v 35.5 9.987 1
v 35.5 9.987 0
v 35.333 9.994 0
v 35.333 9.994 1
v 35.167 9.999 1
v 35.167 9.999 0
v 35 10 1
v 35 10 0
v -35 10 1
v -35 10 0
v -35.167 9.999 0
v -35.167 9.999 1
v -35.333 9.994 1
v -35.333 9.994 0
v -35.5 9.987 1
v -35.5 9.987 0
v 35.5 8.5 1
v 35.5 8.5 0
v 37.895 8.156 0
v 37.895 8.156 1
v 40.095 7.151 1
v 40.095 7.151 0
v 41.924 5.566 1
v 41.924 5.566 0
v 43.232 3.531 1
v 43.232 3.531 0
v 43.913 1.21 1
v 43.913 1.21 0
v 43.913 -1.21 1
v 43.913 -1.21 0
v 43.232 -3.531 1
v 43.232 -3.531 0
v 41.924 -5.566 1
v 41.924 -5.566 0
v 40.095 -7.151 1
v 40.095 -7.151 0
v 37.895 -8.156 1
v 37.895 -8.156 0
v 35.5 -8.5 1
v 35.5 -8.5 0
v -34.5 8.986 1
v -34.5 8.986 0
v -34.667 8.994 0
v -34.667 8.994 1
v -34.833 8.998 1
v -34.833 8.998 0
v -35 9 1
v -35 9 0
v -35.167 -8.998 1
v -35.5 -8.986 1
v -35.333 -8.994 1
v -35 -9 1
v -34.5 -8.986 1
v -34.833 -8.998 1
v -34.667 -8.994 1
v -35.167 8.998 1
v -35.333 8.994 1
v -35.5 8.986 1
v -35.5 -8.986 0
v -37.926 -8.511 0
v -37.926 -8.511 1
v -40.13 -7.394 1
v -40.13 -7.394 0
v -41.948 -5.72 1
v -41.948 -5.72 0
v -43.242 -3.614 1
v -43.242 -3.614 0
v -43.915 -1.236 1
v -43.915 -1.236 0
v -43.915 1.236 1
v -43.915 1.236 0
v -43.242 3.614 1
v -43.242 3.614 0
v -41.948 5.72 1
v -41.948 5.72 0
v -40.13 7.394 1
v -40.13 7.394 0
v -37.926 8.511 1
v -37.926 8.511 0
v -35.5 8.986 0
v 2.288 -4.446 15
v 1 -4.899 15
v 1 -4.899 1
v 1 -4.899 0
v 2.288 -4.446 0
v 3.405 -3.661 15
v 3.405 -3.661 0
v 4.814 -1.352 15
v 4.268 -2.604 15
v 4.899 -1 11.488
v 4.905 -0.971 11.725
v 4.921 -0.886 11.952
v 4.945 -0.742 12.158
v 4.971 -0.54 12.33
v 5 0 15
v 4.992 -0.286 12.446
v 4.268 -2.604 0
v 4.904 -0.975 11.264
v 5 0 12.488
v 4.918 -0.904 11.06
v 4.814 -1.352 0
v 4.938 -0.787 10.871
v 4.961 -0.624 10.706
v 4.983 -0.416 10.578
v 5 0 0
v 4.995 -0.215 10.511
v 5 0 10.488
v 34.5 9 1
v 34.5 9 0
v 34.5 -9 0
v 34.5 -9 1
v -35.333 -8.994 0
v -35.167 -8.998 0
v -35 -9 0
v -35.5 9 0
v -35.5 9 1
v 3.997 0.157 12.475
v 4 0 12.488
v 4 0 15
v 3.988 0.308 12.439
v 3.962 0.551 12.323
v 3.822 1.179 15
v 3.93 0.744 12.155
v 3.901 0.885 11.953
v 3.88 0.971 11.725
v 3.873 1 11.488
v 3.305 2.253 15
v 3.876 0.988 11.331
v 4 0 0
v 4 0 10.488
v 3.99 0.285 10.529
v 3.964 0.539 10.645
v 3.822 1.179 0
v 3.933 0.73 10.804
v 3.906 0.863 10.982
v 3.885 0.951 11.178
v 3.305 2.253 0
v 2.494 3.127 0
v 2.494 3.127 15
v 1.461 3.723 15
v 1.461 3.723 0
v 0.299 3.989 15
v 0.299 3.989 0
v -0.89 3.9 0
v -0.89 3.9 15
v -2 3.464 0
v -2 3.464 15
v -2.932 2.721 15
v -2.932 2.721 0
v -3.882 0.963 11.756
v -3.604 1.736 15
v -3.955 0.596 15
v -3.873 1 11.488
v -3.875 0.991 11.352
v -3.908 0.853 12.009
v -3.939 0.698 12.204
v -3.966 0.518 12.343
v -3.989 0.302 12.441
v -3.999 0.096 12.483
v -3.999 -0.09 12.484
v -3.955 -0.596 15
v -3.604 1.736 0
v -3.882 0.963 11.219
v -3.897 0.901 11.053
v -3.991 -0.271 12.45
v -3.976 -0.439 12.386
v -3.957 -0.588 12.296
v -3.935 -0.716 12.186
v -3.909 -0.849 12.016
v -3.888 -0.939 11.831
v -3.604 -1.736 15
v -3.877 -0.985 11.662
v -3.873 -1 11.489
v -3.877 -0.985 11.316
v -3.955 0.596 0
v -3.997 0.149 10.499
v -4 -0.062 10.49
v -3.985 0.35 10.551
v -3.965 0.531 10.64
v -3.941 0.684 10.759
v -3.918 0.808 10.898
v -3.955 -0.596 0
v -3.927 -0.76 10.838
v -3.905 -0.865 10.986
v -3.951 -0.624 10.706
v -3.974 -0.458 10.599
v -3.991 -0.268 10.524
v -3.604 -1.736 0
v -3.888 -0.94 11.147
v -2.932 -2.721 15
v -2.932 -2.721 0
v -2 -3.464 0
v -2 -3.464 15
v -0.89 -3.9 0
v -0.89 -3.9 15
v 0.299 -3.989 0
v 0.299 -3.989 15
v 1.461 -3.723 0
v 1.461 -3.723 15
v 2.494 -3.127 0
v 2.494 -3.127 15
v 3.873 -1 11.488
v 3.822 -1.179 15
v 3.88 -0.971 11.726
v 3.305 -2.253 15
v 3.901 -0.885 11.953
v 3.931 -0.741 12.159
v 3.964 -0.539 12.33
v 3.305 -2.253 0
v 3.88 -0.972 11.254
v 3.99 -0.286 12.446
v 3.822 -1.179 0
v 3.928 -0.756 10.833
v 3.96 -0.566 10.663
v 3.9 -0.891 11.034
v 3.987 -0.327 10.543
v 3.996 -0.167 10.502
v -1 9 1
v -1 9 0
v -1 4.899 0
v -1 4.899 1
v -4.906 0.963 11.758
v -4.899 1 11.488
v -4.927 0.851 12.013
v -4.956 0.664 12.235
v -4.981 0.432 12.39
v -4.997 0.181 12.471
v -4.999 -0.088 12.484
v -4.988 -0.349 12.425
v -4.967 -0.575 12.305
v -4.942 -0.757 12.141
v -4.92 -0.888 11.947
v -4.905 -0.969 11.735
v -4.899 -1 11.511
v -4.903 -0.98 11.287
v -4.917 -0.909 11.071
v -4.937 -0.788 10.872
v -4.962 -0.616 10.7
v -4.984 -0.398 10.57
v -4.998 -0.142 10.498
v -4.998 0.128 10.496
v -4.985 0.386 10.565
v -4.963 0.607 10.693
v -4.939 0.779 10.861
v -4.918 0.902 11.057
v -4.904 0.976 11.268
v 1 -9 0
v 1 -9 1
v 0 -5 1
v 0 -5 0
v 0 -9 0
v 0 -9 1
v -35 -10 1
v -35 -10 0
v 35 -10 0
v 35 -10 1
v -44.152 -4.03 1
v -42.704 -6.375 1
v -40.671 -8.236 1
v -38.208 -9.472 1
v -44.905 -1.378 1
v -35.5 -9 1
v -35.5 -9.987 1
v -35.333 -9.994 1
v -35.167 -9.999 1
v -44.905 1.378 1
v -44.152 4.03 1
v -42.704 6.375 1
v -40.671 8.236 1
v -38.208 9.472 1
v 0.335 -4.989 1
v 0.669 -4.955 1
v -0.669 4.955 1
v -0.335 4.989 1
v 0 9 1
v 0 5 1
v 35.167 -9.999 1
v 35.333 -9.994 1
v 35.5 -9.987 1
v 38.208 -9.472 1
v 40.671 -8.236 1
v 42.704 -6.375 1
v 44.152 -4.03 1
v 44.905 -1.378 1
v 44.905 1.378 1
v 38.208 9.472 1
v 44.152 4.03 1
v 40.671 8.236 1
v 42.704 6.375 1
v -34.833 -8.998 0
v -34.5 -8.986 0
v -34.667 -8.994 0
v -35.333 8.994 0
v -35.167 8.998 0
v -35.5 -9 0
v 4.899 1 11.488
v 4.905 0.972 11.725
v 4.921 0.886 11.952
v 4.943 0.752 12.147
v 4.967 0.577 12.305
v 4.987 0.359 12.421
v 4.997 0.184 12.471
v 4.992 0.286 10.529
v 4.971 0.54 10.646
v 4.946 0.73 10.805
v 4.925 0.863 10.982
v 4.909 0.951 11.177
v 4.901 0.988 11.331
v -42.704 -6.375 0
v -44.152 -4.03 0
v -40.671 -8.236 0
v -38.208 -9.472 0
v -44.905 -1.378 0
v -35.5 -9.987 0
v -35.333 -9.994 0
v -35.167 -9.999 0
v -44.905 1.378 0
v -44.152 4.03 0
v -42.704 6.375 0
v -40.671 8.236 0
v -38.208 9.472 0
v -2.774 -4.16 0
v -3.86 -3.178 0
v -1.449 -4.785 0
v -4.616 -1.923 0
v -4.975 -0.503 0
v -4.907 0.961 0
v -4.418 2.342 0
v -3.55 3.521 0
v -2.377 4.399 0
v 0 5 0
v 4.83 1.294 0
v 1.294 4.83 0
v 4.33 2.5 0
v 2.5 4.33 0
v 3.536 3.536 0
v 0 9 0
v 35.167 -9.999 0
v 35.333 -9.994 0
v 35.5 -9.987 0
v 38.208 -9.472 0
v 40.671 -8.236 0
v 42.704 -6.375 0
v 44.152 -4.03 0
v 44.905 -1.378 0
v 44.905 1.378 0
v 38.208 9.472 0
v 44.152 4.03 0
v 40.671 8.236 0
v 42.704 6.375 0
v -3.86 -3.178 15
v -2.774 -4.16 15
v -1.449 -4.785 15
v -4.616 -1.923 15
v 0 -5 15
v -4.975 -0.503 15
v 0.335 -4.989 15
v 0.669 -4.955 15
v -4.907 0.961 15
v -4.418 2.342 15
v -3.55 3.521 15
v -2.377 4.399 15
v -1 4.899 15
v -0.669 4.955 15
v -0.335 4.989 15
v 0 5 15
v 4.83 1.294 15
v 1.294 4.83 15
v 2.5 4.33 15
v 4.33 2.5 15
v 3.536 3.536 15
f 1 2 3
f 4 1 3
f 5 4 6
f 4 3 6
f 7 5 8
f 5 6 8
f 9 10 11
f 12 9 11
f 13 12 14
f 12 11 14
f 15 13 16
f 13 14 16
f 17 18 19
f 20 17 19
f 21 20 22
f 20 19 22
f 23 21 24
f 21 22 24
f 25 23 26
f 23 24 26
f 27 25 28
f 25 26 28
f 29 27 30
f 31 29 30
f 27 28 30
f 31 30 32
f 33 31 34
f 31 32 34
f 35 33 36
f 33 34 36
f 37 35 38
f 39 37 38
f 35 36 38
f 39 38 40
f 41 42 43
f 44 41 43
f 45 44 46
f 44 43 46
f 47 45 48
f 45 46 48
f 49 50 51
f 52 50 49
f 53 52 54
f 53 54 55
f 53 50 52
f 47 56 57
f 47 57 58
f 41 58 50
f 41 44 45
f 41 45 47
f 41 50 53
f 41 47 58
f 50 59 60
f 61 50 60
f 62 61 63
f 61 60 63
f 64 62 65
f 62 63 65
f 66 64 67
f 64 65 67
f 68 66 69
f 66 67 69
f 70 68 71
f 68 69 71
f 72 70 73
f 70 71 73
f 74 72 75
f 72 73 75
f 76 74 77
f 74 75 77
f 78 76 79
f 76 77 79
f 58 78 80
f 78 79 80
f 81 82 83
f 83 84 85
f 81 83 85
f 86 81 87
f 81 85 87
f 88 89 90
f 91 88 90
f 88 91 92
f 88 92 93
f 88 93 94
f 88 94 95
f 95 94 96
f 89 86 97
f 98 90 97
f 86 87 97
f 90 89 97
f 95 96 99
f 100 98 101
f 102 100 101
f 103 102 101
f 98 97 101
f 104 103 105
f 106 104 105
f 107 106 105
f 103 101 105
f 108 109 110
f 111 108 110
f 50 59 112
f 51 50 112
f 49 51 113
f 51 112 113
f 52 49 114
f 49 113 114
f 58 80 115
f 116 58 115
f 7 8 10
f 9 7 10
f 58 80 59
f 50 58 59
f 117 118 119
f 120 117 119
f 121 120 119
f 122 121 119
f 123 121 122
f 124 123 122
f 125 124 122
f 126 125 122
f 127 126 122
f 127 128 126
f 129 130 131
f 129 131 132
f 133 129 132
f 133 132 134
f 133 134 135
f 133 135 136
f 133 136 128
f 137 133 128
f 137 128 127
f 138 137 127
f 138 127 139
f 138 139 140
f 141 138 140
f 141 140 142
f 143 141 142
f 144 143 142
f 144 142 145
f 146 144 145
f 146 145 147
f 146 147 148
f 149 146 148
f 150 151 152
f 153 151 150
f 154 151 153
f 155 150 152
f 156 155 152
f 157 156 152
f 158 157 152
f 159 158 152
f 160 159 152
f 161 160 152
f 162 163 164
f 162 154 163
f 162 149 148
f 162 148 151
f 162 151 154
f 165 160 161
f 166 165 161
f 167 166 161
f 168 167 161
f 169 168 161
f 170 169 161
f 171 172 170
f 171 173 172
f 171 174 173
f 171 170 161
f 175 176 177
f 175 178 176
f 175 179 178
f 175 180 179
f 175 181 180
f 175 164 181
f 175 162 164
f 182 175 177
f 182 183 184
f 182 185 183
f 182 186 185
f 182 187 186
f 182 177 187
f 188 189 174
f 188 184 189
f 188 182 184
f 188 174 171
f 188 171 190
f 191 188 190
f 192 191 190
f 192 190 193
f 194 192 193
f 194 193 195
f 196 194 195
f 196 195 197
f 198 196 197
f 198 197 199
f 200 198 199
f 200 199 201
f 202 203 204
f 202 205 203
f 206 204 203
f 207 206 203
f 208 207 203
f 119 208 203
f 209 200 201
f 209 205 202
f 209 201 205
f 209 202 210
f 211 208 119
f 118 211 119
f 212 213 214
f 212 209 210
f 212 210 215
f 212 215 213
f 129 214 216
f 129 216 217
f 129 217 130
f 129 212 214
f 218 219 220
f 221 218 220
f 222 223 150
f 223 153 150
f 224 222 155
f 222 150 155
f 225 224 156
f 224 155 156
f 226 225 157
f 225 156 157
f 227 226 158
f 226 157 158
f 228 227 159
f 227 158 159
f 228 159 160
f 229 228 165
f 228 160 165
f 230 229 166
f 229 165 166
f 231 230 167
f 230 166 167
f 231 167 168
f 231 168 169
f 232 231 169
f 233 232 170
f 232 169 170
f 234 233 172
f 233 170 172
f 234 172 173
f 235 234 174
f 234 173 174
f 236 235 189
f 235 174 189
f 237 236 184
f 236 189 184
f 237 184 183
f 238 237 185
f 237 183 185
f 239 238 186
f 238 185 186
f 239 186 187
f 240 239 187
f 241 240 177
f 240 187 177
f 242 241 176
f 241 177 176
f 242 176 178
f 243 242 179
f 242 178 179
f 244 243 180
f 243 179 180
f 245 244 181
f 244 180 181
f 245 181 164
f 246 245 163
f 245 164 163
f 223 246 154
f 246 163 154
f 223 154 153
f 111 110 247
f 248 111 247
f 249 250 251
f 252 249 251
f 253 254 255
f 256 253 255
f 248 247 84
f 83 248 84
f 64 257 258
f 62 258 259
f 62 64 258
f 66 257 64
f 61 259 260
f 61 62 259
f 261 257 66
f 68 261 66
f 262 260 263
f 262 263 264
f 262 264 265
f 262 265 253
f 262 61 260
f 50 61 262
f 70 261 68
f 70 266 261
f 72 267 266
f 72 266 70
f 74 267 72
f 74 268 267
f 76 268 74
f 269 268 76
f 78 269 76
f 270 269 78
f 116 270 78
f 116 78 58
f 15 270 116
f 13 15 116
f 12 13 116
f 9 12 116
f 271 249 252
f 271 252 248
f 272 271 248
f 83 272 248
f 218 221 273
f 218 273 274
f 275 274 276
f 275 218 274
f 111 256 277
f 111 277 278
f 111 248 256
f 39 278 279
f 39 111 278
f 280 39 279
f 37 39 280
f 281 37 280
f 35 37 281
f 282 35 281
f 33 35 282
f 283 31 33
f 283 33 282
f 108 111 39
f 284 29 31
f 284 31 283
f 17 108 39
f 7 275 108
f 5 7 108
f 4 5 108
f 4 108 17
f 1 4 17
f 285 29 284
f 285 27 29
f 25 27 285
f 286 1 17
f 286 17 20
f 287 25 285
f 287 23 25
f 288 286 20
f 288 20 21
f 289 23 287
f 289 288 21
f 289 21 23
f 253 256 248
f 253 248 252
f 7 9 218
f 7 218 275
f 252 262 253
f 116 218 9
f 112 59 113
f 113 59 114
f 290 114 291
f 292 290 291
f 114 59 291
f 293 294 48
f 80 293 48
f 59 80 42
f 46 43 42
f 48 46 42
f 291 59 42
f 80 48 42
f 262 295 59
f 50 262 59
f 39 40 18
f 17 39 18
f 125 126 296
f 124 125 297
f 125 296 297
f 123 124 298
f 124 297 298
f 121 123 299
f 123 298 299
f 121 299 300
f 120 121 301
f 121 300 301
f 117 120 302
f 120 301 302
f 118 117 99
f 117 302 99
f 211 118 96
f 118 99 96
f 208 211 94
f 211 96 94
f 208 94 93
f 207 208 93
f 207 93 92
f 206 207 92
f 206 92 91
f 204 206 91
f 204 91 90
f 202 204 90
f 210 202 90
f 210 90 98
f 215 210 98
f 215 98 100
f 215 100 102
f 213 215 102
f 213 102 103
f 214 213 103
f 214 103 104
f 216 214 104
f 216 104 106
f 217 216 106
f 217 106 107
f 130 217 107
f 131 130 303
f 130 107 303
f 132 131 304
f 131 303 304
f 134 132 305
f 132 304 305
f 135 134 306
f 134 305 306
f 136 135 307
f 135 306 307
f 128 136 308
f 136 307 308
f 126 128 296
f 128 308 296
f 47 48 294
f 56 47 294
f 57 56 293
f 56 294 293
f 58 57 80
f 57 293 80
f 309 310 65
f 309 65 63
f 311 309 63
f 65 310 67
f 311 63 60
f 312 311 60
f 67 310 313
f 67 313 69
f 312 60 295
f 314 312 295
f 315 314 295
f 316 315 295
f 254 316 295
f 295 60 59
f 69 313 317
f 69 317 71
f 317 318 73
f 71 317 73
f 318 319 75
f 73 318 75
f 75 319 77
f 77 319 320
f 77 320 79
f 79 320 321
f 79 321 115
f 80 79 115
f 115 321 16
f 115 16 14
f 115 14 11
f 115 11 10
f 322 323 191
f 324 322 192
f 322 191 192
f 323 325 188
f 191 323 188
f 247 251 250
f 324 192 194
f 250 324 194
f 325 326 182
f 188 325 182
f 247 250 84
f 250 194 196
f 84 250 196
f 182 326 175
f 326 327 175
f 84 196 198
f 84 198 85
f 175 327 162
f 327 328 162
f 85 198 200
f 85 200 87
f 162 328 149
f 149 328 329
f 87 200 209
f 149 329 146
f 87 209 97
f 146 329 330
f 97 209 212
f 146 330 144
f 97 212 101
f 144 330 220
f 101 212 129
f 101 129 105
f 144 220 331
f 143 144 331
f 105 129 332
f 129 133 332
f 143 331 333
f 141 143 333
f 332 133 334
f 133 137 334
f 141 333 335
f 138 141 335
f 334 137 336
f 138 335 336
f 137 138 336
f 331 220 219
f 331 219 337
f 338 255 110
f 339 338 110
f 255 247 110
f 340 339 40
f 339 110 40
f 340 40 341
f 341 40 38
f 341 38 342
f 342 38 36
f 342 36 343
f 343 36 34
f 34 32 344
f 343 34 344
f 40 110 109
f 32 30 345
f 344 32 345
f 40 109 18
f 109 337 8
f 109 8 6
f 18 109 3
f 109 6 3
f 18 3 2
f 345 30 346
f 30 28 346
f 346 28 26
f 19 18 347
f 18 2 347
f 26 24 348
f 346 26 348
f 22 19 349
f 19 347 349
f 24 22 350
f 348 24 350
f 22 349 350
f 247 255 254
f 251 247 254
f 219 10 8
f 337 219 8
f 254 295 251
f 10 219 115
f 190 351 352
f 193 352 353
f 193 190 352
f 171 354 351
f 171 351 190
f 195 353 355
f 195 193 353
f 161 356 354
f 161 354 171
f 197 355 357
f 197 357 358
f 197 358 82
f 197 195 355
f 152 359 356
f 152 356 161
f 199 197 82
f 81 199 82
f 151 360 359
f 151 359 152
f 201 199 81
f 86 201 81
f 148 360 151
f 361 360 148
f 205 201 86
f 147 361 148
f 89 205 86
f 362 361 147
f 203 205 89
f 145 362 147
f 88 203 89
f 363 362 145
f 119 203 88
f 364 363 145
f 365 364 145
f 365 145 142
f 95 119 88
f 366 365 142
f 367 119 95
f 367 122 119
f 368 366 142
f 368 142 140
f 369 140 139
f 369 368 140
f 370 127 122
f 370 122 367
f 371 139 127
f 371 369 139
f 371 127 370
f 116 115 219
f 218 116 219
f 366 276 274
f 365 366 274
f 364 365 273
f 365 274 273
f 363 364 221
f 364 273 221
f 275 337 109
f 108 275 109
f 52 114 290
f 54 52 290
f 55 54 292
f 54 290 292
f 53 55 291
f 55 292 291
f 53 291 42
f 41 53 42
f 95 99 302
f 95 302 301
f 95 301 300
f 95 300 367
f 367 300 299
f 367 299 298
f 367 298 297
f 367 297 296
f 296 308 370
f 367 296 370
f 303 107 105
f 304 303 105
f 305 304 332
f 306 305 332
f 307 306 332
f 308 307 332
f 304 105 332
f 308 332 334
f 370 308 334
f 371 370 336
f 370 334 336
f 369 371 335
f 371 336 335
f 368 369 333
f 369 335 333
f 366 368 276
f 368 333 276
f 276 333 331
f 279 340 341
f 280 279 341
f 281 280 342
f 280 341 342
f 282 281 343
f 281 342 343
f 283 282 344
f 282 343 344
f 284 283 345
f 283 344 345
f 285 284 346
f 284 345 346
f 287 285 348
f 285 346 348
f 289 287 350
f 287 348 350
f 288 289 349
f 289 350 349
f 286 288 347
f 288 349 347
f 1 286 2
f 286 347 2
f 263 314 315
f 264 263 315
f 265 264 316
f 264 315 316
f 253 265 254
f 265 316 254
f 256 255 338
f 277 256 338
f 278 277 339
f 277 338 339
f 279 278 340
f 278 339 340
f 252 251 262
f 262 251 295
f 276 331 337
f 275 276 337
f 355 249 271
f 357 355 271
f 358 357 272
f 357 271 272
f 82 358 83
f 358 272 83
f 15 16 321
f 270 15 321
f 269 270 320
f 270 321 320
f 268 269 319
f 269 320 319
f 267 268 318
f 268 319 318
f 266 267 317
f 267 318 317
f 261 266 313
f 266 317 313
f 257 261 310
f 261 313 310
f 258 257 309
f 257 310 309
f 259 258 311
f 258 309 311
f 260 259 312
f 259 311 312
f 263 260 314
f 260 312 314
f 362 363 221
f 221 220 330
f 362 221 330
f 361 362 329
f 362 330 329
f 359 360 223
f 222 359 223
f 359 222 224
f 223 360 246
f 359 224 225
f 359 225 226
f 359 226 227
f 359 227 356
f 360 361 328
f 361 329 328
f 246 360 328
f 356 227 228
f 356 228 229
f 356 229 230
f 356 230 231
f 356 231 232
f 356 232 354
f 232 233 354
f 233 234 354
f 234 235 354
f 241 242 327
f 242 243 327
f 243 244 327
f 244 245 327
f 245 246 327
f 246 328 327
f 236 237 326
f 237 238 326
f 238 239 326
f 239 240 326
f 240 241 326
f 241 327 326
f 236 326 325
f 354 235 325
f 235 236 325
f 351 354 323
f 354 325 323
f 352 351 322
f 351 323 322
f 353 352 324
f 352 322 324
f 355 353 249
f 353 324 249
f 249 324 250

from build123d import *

# Parameters (mm, degrees)
F0_W     = 1
F0_H     = 1
F0_W_2   = 34.5
F0_H_2   = 3
F0_W_3   = 33.5
F1_DEPTH = 1
F0_R     = 4
F2_DEPTH = 15
F3_R     = 1
F4_DEPTH = 12.5


with BuildPart() as f1:
    # F0 (on Top) → F1 (new body)
    with BuildSketch(Plane.XY):
        with BuildLine():
            Line((-1, 10), (-35, 10))
            ThreePointArc((-35, 10), (-35.2500782106, 9.9968725554), (-35.5, 9.9874921777))
            Line((-35.5, 9.9874921777), (-34.5, 9.9874921777))
            Line((-34.5, 9.9874921777), (-34.5, 9))
            Line((-34.5, 9), (-1, 9))
            Line((-1, 9), (-1, 10))
        make_face()
        with Locations((-0.5, 9.5)):
            Rectangle(F0_W, F0_H)
        with BuildLine():
            Line((-35.5, 9), (-35.5, 9.9874921777))
            ThreePointArc((-35.5, 9.9874921777), (-45, 0), (-35.5, -9.9874921777))
            Line((-35.5, -9.9874921777), (-35.5, -9))
            Line((-35.5, -9), (-35.5, -8.9861003778))
            ThreePointArc((-35.5, -8.9861003778), (-44, 0), (-35.5, 8.9861003778))
            Line((-35.5, 8.9861003778), (-35.5, 9))
        make_face()
        Polygon((-34.5, 9.9874921777), (-35.5, 9.9874921777), (-35.5, 9), (-35, 9), (-34.5, 9), align=None)
        with Locations((17.25, 9.5)):
            Rectangle(F0_W_2, F0_H)
        with Locations((-0.5, 7.5)):
            Rectangle(F0_W, F0_H_2)
        with BuildLine():
            Line((-34.5, -9.9874921777), (-35.5, -9.9874921777))
            ThreePointArc((-35.5, -9.9874921777), (-35.2500782106, -9.9968725554), (-35, -10))
            Line((-35, -10), (0, -10))
            Line((0, -10), (0, -9))
            Line((0, -9), (-34.5, -9))
            Line((-34.5, -9), (-34.5, -9.9874921777))
        make_face()
        Polygon((-35.5, -9), (-35.5, -9.9874921777), (-34.5, -9.9874921777), (-34.5, -9), (-35, -9), align=None)
        with BuildLine():
            Line((35, 10), (34.5, 10))
            Line((34.5, 10), (34.5, 9))
            Line((34.5, 9), (35.5, 9))
            Line((35.5, 9), (35.5, 9.9874921777))
            ThreePointArc((35.5, 9.9874921777), (35.2500782106, 9.9968725554), (35, 10))
        make_face()
        with BuildLine():
            Line((0, 6), (-1, 6))
            Line((-1, 6), (-1, 4.8989794856))
            ThreePointArc((-1, 4.8989794856), (-0.50254481, 4.974680765), (0, 5))
            Line((0, 5), (0, 6))
        make_face()
        with BuildLine():
            Line((35.5, 9), (34.5, 9))
            Line((34.5, 9), (34.5, 8.4409715081))
            ThreePointArc((34.5, 8.4409715081), (34.9991296668, 8.4852300446), (35.5, 8.5))
            Line((35.5, 8.5), (35.5, 9))
        make_face()
        with Locations((0.5, -9.5)):
            Rectangle(F0_W, F0_H)
        with BuildLine():
            ThreePointArc((35.5, -9.9874921777), (45, 0), (35.5, 9.9874921777))
            Line((35.5, 9.9874921777), (35.5, 9))
            Line((35.5, 9), (35.5, 8.5))
            ThreePointArc((35.5, 8.5), (44, 0), (35.5, -8.5))
            Line((35.5, -8.5), (35.5, -9))
            Line((35.5, -9), (35.5, -9.9874921777))
        make_face()
        with BuildLine():
            ThreePointArc((35.5, 8.5), (34.9991296668, 8.4852300446), (34.5, 8.4409715081))
            Line((34.5, 8.4409715081), (34.5, -8.4409715081))
            ThreePointArc((34.5, -8.4409715081), (34.9991296668, -8.4852300446), (35.5, -8.5))
            Line((35.5, -8.5), (35.5, 8.5))
        make_face()
        with BuildLine():
            ThreePointArc((1, -4.8989794856), (0.50254481, -4.974680765), (0, -5))
            Line((0, -5), (0, -6))
            Line((0, -6), (1, -6))
            Line((1, -6), (1, -4.8989794856))
        make_face()
        with Locations((17.75, -9.5)):
            Rectangle(F0_W_3, F0_H)
        with Locations((0.5, -7.5)):
            Rectangle(F0_W, F0_H_2)
        with BuildLine():
            ThreePointArc((35, -10), (35.2500782106, -9.9968725554), (35.5, -9.9874921777))
            Line((35.5, -9.9874921777), (35.5, -9))
            Line((35.5, -9), (34.5, -9))
            Line((34.5, -9), (34.5, -10))
            Line((34.5, -10), (35, -10))
        make_face()
        with BuildLine():
            ThreePointArc((35.5, -8.5), (34.9991296668, -8.4852300446), (34.5, -8.4409715081))
            Line((34.5, -8.4409715081), (34.5, -9))
            Line((34.5, -9), (35.5, -9))
            Line((35.5, -9), (35.5, -8.5))
        make_face()
    extrude(amount=F1_DEPTH)

    # F0 (on Top) → F2 (join)
    with BuildSketch(Plane.XY):
        with BuildLine():
            ThreePointArc((0, 5), (-0.50254481, 4.974680765), (-1, 4.8989794856))
            ThreePointArc((-1, 4.8989794856), (-4.974680765, -0.50254481), (0, -5))
            ThreePointArc((0, -5), (0.50254481, -4.974680765), (1, -4.8989794856))
            ThreePointArc((1, -4.8989794856), (3.8729833462, -3.1622776602), (5, 0))
            ThreePointArc((5, 0), (3.5355339059, 3.5355339059), (0, 5))
        make_face()
        Circle(F0_R, mode=Mode.SUBTRACT)
    extrude(amount=F2_DEPTH)

    # F3 (on Right) → F4 (cut, symmetric)
    with BuildSketch(Plane.YZ):
        with Locations((0, 11.4876687593)):
            Circle(F3_R)
    extrude(amount=F4_DEPTH, both=True, mode=Mode.SUBTRACT)


with BuildPart() as f1b:
    # F0 (on Top) → F1, piece 2 (new body)
    with BuildSketch(Plane.XY):
        with BuildLine():
            ThreePointArc((-35, 9), (-35.2500965811, 8.9965244234), (-35.5, 8.9861003778))
            Line((-35.5, 8.9861003778), (-35.5, -8.9861003778))
            ThreePointArc((-35.5, -8.9861003778), (-35.2500965811, -8.9965244234), (-35, -9))
            ThreePointArc((-35, -9), (-34.7499034189, -8.9965244234), (-34.5, -8.9861003778))
            Line((-34.5, -8.9861003778), (-34.5, 8.9861003778))
            ThreePointArc((-34.5, 8.9861003778), (-34.7499034189, 8.9965244234), (-35, 9))
        make_face()
    extrude(amount=F1_DEPTH)


solid = Compound([f1.part, f1b.part])
